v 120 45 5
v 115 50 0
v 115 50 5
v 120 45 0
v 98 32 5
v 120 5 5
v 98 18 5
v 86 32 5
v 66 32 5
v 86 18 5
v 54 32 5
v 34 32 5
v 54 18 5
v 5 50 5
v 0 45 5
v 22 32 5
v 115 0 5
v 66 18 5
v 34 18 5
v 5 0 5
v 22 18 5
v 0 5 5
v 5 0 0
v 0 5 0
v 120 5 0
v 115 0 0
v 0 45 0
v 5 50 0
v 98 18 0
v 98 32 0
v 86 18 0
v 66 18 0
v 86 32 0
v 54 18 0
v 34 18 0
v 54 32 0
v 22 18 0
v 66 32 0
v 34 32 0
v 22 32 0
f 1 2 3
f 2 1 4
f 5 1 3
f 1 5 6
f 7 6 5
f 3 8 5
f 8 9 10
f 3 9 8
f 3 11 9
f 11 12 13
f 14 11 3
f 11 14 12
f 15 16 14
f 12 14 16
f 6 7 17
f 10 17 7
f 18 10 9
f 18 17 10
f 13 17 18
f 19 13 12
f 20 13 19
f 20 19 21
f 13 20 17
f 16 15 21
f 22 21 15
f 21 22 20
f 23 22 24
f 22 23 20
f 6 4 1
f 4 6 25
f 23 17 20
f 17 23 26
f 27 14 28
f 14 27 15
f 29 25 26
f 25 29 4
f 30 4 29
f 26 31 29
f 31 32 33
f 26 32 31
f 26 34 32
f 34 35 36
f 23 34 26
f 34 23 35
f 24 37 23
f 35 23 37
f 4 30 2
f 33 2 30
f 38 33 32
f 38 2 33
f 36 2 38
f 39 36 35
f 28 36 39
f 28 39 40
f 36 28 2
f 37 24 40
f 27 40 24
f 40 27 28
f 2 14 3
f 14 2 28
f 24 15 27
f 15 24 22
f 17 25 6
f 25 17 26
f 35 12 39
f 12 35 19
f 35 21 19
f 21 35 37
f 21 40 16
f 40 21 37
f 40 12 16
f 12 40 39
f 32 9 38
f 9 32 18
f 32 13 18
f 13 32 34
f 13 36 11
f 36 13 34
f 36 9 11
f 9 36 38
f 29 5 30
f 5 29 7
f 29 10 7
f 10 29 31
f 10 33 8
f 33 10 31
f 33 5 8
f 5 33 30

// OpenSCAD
$fn = 32;

// ----------------------------------------------------------------------
// Windowed plate: 3 voids, 120 x 50 x 5 mm
// ----------------------------------------------------------------------

// --- parameters (mm) ---
plate_l = 120;            // plate length, X
plate_w = 50;             // plate width, Y
plate_t = 5;              // plate thickness, Z
edge_margin = 12;         // wall from the plate edge to any window
windows = 3;              // number of windows in the row
win_l = 12;               // window length
win_w = 14;               // window width
win_pitch = 32;           // window pitch along X
depth_1 = 5;              // depth of void 1 (full thickness = through)
depth_2 = 5;              // depth of void 2 (full thickness = through)
depth_3 = 5;              // depth of void 3 (full thickness = through)
corner_c = 5;             // corner chamfer of the plate

profile = [[5, 0], [115, 0], [120, 5], [120, 45], [115, 50], [5, 50], [0, 45], [0, 5]];  // primary outline, 8 points, counter clockwise
void_1 = [[22, 18], [34, 18], [34, 32], [22, 32]];  // window 1 of the row, 4 points
void_2 = [[54, 18], [66, 18], [66, 32], [54, 32]];  // window 2 of the row, 4 points
void_3 = [[86, 18], [98, 18], [98, 32], [86, 32]];  // window 3 of the row, 4 points

// --- the one profile operation ---
difference() {
  linear_extrude(height = plate_t) polygon(points = profile);
  translate([0, 0, -1])
    linear_extrude(height = plate_t + 2) polygon(points = void_1);
  translate([0, 0, -1])
    linear_extrude(height = plate_t + 2) polygon(points = void_2);
  translate([0, 0, -1])
    linear_extrude(height = plate_t + 2) polygon(points = void_3);
}
